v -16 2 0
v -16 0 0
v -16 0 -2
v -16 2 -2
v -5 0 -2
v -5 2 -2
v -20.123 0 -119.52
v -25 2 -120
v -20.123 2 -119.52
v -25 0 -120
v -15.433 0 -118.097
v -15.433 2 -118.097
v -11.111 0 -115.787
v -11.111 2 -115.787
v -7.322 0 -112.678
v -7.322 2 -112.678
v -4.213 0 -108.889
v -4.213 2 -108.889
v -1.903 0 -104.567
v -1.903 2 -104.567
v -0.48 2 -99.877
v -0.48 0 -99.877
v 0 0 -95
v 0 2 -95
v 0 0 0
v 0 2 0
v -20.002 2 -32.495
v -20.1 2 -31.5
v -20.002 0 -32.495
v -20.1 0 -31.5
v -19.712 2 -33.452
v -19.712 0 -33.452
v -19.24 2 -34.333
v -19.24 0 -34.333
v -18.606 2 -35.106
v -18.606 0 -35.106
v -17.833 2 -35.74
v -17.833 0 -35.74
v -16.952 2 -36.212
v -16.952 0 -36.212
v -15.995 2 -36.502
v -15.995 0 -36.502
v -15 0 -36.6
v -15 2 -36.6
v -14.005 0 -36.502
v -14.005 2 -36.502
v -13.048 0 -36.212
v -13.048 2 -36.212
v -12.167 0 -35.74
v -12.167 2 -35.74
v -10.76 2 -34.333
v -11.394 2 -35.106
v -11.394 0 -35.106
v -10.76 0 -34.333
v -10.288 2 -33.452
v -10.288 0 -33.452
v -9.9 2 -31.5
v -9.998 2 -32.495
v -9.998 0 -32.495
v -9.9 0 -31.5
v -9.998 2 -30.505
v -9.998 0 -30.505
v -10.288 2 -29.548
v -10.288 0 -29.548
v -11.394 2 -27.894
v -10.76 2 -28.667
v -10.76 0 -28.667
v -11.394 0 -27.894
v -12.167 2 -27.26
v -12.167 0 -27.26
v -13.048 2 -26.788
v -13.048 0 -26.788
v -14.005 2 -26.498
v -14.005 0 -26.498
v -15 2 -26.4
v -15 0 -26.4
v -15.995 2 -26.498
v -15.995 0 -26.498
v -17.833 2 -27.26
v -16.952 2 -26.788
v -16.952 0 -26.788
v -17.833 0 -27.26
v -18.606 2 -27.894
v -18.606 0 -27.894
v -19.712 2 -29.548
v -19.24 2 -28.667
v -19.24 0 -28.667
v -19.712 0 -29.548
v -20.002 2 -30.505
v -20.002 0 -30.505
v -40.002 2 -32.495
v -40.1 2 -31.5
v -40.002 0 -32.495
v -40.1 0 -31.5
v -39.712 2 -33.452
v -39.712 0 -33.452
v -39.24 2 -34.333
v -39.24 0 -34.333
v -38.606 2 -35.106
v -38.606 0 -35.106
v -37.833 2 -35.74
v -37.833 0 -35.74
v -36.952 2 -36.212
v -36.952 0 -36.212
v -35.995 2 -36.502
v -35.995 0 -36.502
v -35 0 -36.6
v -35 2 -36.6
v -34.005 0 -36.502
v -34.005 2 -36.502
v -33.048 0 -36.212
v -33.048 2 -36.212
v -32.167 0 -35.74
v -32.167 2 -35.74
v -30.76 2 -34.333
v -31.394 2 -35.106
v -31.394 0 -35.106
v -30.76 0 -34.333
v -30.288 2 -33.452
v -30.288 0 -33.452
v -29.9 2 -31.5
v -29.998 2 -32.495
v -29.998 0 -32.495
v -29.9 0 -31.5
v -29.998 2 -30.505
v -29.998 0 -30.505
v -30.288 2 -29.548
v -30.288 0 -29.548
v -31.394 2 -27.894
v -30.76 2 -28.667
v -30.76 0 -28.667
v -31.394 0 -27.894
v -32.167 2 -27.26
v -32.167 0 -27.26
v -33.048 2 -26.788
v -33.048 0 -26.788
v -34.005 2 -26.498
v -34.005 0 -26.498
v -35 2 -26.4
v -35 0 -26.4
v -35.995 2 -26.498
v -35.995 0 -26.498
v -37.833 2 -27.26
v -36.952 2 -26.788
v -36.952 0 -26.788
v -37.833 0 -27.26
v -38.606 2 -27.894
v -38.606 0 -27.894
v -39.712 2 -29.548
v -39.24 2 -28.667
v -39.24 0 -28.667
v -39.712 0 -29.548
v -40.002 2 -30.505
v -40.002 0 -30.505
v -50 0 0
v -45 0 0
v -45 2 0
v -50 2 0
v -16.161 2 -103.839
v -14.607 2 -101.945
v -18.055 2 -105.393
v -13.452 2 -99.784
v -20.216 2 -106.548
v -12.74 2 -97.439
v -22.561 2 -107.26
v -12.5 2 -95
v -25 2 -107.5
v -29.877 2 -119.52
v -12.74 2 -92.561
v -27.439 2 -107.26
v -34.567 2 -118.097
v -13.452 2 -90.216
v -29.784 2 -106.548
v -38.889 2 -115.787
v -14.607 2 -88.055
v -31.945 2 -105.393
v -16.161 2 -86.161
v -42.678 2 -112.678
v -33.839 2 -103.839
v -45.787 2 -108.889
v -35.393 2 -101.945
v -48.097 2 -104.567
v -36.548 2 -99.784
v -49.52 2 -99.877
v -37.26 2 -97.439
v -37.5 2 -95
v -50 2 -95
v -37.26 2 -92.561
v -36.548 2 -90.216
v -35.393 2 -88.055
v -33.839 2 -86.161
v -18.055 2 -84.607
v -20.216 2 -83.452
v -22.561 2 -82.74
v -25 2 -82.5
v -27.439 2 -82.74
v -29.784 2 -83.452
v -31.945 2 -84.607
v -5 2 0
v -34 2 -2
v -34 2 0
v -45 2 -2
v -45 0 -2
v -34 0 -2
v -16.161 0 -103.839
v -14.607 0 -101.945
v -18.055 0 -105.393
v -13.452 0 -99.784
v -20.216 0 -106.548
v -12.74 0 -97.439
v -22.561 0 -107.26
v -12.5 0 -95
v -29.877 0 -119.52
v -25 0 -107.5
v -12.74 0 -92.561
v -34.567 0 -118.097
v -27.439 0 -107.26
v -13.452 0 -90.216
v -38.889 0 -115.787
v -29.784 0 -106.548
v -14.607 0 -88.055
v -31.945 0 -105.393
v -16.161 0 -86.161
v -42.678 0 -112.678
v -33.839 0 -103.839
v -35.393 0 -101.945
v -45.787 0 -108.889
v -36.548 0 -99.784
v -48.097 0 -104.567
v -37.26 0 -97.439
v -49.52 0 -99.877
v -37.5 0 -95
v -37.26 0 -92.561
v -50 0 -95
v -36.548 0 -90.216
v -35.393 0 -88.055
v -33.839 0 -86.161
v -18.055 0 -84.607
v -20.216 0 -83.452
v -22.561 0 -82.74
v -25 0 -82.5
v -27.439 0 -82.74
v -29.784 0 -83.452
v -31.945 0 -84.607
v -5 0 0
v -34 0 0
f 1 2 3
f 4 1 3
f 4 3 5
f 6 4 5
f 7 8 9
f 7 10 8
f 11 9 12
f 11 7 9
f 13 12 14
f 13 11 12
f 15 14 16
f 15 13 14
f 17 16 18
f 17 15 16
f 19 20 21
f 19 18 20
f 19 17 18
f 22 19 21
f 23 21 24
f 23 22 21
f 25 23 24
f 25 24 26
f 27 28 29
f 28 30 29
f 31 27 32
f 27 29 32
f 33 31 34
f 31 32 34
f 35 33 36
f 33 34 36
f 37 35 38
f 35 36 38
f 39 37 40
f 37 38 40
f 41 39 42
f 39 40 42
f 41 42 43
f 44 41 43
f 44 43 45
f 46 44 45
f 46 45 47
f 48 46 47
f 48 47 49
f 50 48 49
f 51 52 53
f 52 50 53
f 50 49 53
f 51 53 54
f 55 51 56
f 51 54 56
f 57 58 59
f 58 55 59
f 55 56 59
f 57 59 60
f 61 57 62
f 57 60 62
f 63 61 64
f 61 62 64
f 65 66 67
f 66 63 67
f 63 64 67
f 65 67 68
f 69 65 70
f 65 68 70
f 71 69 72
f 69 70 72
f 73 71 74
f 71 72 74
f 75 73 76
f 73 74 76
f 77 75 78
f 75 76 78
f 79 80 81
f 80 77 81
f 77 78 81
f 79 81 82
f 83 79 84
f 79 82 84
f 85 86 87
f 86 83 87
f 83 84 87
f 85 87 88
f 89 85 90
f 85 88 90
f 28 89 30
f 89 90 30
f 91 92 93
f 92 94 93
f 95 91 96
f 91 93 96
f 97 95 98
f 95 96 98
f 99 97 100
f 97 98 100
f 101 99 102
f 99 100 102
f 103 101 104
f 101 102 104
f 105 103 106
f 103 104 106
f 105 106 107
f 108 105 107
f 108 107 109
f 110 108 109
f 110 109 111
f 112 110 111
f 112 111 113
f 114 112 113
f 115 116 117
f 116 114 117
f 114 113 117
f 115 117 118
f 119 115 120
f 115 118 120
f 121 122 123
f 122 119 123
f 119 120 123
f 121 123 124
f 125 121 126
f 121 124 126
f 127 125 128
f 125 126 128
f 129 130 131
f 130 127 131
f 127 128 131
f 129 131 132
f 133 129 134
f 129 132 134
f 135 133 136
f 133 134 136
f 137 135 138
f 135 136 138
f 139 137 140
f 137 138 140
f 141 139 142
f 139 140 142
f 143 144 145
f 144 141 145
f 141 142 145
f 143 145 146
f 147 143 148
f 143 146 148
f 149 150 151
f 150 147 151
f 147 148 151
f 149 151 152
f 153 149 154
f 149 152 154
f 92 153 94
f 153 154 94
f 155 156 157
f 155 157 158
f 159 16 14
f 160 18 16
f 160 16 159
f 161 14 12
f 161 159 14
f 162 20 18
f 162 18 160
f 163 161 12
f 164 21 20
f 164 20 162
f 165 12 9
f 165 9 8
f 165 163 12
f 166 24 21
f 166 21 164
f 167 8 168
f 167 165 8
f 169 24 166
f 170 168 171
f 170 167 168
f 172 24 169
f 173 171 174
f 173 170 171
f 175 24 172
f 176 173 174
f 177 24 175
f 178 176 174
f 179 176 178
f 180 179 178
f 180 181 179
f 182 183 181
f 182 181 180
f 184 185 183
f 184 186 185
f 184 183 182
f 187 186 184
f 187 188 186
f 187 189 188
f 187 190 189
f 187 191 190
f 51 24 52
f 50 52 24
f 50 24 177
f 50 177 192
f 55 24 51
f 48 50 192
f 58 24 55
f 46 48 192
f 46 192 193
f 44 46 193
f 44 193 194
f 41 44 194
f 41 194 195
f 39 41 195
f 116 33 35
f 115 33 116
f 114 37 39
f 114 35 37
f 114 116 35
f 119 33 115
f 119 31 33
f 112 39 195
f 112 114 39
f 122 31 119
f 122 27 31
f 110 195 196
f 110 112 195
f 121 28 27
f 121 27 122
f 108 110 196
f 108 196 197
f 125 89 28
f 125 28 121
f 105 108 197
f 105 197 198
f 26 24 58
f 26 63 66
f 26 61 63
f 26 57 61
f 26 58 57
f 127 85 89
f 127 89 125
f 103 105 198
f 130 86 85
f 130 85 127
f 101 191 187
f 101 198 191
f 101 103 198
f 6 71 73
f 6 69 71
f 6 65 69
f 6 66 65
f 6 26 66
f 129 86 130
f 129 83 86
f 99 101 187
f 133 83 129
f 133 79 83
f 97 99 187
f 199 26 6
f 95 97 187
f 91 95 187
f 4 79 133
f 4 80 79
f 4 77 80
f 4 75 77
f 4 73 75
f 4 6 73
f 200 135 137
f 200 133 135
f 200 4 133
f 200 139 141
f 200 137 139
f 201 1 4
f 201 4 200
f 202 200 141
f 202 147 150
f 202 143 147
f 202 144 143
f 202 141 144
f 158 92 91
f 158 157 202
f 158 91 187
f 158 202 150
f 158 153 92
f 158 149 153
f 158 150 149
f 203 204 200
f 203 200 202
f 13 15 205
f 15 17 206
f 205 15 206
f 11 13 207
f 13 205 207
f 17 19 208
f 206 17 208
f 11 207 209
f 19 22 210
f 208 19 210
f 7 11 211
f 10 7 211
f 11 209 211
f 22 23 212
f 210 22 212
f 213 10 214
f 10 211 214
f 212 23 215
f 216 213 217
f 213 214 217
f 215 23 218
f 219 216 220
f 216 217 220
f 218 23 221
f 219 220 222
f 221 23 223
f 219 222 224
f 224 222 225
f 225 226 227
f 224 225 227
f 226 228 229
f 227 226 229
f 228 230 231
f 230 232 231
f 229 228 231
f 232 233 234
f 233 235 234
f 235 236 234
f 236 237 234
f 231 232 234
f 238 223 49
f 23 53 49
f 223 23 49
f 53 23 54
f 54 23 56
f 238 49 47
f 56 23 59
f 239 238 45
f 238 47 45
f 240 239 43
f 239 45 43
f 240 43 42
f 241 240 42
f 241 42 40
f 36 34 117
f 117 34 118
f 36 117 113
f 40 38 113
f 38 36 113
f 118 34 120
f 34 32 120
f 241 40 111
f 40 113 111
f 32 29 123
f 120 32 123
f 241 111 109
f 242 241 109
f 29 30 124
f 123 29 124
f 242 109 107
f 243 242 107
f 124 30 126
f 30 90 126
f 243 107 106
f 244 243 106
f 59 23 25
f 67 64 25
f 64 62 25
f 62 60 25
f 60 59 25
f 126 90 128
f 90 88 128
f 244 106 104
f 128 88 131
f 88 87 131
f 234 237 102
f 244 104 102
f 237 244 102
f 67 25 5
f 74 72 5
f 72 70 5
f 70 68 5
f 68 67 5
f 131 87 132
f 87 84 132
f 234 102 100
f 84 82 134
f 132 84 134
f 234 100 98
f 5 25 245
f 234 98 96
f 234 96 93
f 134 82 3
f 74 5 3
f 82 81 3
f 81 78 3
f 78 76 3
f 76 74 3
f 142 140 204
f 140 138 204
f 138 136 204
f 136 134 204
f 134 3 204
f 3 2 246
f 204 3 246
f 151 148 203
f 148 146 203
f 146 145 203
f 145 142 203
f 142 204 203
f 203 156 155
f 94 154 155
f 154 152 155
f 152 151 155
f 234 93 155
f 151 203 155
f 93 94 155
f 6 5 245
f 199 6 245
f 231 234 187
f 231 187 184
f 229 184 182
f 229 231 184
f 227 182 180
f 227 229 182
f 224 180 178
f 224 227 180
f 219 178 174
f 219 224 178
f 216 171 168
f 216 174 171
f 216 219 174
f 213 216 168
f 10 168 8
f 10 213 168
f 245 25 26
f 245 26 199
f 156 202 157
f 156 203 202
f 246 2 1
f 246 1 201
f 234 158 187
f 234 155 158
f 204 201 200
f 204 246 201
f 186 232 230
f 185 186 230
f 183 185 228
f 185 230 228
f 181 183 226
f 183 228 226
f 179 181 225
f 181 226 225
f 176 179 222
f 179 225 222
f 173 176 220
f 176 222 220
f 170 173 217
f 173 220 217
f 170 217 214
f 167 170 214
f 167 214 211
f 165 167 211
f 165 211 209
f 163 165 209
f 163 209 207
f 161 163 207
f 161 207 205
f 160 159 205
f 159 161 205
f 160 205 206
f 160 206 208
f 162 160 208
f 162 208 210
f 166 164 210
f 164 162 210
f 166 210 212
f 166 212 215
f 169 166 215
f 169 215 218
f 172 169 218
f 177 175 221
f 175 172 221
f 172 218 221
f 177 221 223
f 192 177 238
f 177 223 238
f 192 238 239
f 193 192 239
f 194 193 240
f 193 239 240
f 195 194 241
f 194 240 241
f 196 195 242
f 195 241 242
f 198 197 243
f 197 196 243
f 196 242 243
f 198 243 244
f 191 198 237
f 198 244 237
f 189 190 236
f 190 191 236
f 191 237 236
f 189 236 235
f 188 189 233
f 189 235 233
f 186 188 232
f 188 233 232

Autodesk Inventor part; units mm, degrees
ref_plane "YZ Plane" through (0, 0, 0) normal (1, 0, 0) x (0, 1, 0)
ref_plane "XZ Plane" through (0, 0, 0) normal (0, 1, 0) x (-1, 0, 0)
ref_plane "XY Plane" through (0, 0, 0) normal (0, 0, 1) x (1, 0, 0)
sketch "Sketch1" plane through (0, 0, 0) normal (0, 1, 0) x (-1, 0, 0)
  line L0 (0, 0) -> (50, 0)
  line L1 (50, 0) -> (50, -120)
  line L2 (50, -120) -> (0, -120)
  line L3 (0, -120) -> (0, 0)
  circle A0 centre (35, -31.5) radius 5.1
  circle A1 centre (25, -95) radius 12.5
  arc A2 (0, -95) -> (50, -95) centre (25, -95) ccw
  line L4 (45, 0) -> (34, 0)
  line L5 (34, 0) -> (34, -2)
  line L6 (34, -2) -> (45, -2)
  line L7 (45, -2) -> (45, 0)
  line L8 (16, -2) -> (5, -2)
  line L9 (5, -2) -> (5, 0)
  line L10 (5, 0) -> (16, 0)
  line L11 (16, 0) -> (16, -2)
  line L12 (50, -95) -> (0, -95) construction
  circle A3 centre (15, -31.5) radius 5.1
  dimension "d0" = 10.2
  dimension "d1" = 25
  dimension "d2" = 2
  dimension "d3" = 2
  dimension "d6" = 5
  dimension "d7" = 11
  dimension "d8" = 5
  dimension "d9" = 11
  dimension "d10" = 50
  dimension "d12" = 25
  dimension "d13" = 120
  dimension "d14" = 31.5
  dimension "d16" = 10.2
  dimension "d17" = 31.5
  dimension "d18" = 20
  dimension "d19" = 15
extrude "Plate2" add sketch "Sketch1" along normal blind 2 contours L0 L9 L8 L11 L5 L6 L7 L1 A2 L3
equation "\"d7\" = d9"
equation "\"d12\" = 0.5 * d10"
equation "\"d17\" = d14"
equation "\"d19\" = -0.5 * d18 + 0.5 * d10"
equation "\"d20\" = Thickness"
equation "\"BendRadius\" = Thickness"
equation "\"BendReliefWidth\" = Thickness"
equation "\"BendReliefDepth\" = 0.5 * Thickness"
equation "\"CornerReliefSize\" = 4 * Thickness"
equation "\"MinimumRemnant\" = 2 * Thickness"
equation "\"TransitionRadius\" = BendRadius"
equation "\"JacobiRadiusSize\" = BendRadius"
equation "\"GapSize\" = Thickness"
equation "\"Thickness\" = 2"
properties part number "side_beslag"
